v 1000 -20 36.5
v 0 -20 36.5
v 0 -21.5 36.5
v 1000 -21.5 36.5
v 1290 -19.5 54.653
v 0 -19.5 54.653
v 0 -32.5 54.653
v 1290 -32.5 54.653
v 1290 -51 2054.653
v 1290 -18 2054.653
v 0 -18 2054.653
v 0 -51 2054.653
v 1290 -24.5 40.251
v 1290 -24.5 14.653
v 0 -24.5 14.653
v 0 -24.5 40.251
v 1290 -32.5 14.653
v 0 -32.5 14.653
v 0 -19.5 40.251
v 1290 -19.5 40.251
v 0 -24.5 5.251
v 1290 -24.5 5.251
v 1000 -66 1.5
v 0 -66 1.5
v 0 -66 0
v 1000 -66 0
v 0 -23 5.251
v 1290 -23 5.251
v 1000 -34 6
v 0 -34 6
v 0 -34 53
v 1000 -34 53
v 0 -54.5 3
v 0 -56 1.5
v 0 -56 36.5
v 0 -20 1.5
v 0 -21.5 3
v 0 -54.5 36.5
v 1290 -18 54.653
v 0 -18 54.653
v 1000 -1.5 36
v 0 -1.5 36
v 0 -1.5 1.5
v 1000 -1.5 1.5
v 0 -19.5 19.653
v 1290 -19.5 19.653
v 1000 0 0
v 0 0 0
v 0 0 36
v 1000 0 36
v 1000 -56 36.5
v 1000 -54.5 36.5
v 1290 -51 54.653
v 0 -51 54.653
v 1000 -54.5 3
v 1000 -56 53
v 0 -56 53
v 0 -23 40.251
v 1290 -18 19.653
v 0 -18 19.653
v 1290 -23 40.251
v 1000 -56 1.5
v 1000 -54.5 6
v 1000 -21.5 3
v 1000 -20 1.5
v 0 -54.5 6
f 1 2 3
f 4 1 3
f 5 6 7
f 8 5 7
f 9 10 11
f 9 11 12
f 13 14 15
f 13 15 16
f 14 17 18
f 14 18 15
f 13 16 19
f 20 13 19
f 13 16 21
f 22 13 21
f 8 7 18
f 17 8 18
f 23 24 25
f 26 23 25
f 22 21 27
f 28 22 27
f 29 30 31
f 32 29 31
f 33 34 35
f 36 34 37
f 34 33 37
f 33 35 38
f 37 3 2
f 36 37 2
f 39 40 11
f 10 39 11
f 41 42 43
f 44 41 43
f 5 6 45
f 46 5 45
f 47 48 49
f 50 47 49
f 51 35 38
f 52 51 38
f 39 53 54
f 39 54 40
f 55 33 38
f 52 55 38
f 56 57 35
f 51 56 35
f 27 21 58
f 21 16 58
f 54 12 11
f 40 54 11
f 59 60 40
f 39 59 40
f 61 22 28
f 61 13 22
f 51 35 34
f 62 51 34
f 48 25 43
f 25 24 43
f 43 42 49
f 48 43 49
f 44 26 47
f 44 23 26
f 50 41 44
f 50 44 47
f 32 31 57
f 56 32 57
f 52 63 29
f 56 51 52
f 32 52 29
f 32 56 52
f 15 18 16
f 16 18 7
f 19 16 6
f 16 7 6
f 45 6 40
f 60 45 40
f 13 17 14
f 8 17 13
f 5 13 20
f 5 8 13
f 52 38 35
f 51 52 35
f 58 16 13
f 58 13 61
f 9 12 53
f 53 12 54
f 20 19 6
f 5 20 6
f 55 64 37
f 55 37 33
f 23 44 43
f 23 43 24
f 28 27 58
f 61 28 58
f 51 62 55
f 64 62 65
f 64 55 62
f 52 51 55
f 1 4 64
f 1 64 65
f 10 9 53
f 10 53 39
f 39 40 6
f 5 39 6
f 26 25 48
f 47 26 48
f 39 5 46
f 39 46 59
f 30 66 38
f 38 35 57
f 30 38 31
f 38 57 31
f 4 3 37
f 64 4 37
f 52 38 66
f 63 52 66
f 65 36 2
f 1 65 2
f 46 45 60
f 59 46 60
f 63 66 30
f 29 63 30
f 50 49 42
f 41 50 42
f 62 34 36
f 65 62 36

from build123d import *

# Parameters (mm, degrees)
F0_W     = 1.5
F0_H     = 9.402058
F0_H_2   = 25.597942
F1_DEPTH = 1290
F2_DEPTH = 1290
F3_DEPTH = 1000
F4_DEPTH = 1000
F5_DEPTH = 1290


with BuildPart() as f1:
    # F0 (on Right) → F1 (new body)
    with BuildSketch(Plane.YZ):
        Polygon((-18, 19.653404), (-18, 54.653404), (-19.5, 54.653404), (-19.5, 40.251346), (-19.5, 19.653404), align=None)
        with Locations((-23.75, 9.952375)):
            Rectangle(F0_W, F0_H)
        with Locations((-23.75, 27.452375)):
            Rectangle(F0_W, F0_H_2)
    extrude(amount=F1_DEPTH)


with BuildPart() as f2:
    # F0 (on Right) → F2 (new body, through all)
    with BuildSketch(Plane.YZ):
        Polygon((-19.5, 40.251346), (-19.5, 54.653404), (-32.5, 54.653404), (-32.5, 14.653404), (-24.5, 14.653404), (-24.5, 40.251346), (-23, 40.251346), align=None)
    extrude(amount=F2_DEPTH)


with BuildPart() as f3:
    # F0 (on Right) → F3 (new body)
    with BuildSketch(Plane.YZ):
        Polygon((-66, 0), (0, 0), (0, 36), (-1.5, 36), (-1.5, 1.5), (-20, 1.5), (-56, 1.5), (-66, 1.5), align=None)
        Polygon((-56, 53), (-56, 36.5), (-54.5, 36.5), (-54.5, 6), (-34, 6), (-34, 53), (-52.719209, 53), align=None)
    extrude(amount=F3_DEPTH)


with BuildPart() as f4:
    # F0 (on Right) → F4 (new body)
    with BuildSketch(Plane.YZ):
        Polygon((-56, 36.5), (-56, 1.5), (-20, 1.5), (-20, 36.5), (-21.5, 36.5), (-21.5, 3), (-54.5, 3), (-54.5, 6), (-54.5, 36.5), align=None)
    extrude(amount=F4_DEPTH)


with BuildPart() as f5:
    # F0 (on Right) → F5 (new body, through all)
    with BuildSketch(Plane.YZ):
        Polygon((-18, 54.653404), (-18, 2054.653404), (-51, 2054.653404), (-51, 54.653404), (-32.5, 54.653404), (-19.5, 54.653404), align=None)
    extrude(amount=F5_DEPTH)


solid = Compound([f1.part, f2.part, f3.part, f4.part, f5.part])
